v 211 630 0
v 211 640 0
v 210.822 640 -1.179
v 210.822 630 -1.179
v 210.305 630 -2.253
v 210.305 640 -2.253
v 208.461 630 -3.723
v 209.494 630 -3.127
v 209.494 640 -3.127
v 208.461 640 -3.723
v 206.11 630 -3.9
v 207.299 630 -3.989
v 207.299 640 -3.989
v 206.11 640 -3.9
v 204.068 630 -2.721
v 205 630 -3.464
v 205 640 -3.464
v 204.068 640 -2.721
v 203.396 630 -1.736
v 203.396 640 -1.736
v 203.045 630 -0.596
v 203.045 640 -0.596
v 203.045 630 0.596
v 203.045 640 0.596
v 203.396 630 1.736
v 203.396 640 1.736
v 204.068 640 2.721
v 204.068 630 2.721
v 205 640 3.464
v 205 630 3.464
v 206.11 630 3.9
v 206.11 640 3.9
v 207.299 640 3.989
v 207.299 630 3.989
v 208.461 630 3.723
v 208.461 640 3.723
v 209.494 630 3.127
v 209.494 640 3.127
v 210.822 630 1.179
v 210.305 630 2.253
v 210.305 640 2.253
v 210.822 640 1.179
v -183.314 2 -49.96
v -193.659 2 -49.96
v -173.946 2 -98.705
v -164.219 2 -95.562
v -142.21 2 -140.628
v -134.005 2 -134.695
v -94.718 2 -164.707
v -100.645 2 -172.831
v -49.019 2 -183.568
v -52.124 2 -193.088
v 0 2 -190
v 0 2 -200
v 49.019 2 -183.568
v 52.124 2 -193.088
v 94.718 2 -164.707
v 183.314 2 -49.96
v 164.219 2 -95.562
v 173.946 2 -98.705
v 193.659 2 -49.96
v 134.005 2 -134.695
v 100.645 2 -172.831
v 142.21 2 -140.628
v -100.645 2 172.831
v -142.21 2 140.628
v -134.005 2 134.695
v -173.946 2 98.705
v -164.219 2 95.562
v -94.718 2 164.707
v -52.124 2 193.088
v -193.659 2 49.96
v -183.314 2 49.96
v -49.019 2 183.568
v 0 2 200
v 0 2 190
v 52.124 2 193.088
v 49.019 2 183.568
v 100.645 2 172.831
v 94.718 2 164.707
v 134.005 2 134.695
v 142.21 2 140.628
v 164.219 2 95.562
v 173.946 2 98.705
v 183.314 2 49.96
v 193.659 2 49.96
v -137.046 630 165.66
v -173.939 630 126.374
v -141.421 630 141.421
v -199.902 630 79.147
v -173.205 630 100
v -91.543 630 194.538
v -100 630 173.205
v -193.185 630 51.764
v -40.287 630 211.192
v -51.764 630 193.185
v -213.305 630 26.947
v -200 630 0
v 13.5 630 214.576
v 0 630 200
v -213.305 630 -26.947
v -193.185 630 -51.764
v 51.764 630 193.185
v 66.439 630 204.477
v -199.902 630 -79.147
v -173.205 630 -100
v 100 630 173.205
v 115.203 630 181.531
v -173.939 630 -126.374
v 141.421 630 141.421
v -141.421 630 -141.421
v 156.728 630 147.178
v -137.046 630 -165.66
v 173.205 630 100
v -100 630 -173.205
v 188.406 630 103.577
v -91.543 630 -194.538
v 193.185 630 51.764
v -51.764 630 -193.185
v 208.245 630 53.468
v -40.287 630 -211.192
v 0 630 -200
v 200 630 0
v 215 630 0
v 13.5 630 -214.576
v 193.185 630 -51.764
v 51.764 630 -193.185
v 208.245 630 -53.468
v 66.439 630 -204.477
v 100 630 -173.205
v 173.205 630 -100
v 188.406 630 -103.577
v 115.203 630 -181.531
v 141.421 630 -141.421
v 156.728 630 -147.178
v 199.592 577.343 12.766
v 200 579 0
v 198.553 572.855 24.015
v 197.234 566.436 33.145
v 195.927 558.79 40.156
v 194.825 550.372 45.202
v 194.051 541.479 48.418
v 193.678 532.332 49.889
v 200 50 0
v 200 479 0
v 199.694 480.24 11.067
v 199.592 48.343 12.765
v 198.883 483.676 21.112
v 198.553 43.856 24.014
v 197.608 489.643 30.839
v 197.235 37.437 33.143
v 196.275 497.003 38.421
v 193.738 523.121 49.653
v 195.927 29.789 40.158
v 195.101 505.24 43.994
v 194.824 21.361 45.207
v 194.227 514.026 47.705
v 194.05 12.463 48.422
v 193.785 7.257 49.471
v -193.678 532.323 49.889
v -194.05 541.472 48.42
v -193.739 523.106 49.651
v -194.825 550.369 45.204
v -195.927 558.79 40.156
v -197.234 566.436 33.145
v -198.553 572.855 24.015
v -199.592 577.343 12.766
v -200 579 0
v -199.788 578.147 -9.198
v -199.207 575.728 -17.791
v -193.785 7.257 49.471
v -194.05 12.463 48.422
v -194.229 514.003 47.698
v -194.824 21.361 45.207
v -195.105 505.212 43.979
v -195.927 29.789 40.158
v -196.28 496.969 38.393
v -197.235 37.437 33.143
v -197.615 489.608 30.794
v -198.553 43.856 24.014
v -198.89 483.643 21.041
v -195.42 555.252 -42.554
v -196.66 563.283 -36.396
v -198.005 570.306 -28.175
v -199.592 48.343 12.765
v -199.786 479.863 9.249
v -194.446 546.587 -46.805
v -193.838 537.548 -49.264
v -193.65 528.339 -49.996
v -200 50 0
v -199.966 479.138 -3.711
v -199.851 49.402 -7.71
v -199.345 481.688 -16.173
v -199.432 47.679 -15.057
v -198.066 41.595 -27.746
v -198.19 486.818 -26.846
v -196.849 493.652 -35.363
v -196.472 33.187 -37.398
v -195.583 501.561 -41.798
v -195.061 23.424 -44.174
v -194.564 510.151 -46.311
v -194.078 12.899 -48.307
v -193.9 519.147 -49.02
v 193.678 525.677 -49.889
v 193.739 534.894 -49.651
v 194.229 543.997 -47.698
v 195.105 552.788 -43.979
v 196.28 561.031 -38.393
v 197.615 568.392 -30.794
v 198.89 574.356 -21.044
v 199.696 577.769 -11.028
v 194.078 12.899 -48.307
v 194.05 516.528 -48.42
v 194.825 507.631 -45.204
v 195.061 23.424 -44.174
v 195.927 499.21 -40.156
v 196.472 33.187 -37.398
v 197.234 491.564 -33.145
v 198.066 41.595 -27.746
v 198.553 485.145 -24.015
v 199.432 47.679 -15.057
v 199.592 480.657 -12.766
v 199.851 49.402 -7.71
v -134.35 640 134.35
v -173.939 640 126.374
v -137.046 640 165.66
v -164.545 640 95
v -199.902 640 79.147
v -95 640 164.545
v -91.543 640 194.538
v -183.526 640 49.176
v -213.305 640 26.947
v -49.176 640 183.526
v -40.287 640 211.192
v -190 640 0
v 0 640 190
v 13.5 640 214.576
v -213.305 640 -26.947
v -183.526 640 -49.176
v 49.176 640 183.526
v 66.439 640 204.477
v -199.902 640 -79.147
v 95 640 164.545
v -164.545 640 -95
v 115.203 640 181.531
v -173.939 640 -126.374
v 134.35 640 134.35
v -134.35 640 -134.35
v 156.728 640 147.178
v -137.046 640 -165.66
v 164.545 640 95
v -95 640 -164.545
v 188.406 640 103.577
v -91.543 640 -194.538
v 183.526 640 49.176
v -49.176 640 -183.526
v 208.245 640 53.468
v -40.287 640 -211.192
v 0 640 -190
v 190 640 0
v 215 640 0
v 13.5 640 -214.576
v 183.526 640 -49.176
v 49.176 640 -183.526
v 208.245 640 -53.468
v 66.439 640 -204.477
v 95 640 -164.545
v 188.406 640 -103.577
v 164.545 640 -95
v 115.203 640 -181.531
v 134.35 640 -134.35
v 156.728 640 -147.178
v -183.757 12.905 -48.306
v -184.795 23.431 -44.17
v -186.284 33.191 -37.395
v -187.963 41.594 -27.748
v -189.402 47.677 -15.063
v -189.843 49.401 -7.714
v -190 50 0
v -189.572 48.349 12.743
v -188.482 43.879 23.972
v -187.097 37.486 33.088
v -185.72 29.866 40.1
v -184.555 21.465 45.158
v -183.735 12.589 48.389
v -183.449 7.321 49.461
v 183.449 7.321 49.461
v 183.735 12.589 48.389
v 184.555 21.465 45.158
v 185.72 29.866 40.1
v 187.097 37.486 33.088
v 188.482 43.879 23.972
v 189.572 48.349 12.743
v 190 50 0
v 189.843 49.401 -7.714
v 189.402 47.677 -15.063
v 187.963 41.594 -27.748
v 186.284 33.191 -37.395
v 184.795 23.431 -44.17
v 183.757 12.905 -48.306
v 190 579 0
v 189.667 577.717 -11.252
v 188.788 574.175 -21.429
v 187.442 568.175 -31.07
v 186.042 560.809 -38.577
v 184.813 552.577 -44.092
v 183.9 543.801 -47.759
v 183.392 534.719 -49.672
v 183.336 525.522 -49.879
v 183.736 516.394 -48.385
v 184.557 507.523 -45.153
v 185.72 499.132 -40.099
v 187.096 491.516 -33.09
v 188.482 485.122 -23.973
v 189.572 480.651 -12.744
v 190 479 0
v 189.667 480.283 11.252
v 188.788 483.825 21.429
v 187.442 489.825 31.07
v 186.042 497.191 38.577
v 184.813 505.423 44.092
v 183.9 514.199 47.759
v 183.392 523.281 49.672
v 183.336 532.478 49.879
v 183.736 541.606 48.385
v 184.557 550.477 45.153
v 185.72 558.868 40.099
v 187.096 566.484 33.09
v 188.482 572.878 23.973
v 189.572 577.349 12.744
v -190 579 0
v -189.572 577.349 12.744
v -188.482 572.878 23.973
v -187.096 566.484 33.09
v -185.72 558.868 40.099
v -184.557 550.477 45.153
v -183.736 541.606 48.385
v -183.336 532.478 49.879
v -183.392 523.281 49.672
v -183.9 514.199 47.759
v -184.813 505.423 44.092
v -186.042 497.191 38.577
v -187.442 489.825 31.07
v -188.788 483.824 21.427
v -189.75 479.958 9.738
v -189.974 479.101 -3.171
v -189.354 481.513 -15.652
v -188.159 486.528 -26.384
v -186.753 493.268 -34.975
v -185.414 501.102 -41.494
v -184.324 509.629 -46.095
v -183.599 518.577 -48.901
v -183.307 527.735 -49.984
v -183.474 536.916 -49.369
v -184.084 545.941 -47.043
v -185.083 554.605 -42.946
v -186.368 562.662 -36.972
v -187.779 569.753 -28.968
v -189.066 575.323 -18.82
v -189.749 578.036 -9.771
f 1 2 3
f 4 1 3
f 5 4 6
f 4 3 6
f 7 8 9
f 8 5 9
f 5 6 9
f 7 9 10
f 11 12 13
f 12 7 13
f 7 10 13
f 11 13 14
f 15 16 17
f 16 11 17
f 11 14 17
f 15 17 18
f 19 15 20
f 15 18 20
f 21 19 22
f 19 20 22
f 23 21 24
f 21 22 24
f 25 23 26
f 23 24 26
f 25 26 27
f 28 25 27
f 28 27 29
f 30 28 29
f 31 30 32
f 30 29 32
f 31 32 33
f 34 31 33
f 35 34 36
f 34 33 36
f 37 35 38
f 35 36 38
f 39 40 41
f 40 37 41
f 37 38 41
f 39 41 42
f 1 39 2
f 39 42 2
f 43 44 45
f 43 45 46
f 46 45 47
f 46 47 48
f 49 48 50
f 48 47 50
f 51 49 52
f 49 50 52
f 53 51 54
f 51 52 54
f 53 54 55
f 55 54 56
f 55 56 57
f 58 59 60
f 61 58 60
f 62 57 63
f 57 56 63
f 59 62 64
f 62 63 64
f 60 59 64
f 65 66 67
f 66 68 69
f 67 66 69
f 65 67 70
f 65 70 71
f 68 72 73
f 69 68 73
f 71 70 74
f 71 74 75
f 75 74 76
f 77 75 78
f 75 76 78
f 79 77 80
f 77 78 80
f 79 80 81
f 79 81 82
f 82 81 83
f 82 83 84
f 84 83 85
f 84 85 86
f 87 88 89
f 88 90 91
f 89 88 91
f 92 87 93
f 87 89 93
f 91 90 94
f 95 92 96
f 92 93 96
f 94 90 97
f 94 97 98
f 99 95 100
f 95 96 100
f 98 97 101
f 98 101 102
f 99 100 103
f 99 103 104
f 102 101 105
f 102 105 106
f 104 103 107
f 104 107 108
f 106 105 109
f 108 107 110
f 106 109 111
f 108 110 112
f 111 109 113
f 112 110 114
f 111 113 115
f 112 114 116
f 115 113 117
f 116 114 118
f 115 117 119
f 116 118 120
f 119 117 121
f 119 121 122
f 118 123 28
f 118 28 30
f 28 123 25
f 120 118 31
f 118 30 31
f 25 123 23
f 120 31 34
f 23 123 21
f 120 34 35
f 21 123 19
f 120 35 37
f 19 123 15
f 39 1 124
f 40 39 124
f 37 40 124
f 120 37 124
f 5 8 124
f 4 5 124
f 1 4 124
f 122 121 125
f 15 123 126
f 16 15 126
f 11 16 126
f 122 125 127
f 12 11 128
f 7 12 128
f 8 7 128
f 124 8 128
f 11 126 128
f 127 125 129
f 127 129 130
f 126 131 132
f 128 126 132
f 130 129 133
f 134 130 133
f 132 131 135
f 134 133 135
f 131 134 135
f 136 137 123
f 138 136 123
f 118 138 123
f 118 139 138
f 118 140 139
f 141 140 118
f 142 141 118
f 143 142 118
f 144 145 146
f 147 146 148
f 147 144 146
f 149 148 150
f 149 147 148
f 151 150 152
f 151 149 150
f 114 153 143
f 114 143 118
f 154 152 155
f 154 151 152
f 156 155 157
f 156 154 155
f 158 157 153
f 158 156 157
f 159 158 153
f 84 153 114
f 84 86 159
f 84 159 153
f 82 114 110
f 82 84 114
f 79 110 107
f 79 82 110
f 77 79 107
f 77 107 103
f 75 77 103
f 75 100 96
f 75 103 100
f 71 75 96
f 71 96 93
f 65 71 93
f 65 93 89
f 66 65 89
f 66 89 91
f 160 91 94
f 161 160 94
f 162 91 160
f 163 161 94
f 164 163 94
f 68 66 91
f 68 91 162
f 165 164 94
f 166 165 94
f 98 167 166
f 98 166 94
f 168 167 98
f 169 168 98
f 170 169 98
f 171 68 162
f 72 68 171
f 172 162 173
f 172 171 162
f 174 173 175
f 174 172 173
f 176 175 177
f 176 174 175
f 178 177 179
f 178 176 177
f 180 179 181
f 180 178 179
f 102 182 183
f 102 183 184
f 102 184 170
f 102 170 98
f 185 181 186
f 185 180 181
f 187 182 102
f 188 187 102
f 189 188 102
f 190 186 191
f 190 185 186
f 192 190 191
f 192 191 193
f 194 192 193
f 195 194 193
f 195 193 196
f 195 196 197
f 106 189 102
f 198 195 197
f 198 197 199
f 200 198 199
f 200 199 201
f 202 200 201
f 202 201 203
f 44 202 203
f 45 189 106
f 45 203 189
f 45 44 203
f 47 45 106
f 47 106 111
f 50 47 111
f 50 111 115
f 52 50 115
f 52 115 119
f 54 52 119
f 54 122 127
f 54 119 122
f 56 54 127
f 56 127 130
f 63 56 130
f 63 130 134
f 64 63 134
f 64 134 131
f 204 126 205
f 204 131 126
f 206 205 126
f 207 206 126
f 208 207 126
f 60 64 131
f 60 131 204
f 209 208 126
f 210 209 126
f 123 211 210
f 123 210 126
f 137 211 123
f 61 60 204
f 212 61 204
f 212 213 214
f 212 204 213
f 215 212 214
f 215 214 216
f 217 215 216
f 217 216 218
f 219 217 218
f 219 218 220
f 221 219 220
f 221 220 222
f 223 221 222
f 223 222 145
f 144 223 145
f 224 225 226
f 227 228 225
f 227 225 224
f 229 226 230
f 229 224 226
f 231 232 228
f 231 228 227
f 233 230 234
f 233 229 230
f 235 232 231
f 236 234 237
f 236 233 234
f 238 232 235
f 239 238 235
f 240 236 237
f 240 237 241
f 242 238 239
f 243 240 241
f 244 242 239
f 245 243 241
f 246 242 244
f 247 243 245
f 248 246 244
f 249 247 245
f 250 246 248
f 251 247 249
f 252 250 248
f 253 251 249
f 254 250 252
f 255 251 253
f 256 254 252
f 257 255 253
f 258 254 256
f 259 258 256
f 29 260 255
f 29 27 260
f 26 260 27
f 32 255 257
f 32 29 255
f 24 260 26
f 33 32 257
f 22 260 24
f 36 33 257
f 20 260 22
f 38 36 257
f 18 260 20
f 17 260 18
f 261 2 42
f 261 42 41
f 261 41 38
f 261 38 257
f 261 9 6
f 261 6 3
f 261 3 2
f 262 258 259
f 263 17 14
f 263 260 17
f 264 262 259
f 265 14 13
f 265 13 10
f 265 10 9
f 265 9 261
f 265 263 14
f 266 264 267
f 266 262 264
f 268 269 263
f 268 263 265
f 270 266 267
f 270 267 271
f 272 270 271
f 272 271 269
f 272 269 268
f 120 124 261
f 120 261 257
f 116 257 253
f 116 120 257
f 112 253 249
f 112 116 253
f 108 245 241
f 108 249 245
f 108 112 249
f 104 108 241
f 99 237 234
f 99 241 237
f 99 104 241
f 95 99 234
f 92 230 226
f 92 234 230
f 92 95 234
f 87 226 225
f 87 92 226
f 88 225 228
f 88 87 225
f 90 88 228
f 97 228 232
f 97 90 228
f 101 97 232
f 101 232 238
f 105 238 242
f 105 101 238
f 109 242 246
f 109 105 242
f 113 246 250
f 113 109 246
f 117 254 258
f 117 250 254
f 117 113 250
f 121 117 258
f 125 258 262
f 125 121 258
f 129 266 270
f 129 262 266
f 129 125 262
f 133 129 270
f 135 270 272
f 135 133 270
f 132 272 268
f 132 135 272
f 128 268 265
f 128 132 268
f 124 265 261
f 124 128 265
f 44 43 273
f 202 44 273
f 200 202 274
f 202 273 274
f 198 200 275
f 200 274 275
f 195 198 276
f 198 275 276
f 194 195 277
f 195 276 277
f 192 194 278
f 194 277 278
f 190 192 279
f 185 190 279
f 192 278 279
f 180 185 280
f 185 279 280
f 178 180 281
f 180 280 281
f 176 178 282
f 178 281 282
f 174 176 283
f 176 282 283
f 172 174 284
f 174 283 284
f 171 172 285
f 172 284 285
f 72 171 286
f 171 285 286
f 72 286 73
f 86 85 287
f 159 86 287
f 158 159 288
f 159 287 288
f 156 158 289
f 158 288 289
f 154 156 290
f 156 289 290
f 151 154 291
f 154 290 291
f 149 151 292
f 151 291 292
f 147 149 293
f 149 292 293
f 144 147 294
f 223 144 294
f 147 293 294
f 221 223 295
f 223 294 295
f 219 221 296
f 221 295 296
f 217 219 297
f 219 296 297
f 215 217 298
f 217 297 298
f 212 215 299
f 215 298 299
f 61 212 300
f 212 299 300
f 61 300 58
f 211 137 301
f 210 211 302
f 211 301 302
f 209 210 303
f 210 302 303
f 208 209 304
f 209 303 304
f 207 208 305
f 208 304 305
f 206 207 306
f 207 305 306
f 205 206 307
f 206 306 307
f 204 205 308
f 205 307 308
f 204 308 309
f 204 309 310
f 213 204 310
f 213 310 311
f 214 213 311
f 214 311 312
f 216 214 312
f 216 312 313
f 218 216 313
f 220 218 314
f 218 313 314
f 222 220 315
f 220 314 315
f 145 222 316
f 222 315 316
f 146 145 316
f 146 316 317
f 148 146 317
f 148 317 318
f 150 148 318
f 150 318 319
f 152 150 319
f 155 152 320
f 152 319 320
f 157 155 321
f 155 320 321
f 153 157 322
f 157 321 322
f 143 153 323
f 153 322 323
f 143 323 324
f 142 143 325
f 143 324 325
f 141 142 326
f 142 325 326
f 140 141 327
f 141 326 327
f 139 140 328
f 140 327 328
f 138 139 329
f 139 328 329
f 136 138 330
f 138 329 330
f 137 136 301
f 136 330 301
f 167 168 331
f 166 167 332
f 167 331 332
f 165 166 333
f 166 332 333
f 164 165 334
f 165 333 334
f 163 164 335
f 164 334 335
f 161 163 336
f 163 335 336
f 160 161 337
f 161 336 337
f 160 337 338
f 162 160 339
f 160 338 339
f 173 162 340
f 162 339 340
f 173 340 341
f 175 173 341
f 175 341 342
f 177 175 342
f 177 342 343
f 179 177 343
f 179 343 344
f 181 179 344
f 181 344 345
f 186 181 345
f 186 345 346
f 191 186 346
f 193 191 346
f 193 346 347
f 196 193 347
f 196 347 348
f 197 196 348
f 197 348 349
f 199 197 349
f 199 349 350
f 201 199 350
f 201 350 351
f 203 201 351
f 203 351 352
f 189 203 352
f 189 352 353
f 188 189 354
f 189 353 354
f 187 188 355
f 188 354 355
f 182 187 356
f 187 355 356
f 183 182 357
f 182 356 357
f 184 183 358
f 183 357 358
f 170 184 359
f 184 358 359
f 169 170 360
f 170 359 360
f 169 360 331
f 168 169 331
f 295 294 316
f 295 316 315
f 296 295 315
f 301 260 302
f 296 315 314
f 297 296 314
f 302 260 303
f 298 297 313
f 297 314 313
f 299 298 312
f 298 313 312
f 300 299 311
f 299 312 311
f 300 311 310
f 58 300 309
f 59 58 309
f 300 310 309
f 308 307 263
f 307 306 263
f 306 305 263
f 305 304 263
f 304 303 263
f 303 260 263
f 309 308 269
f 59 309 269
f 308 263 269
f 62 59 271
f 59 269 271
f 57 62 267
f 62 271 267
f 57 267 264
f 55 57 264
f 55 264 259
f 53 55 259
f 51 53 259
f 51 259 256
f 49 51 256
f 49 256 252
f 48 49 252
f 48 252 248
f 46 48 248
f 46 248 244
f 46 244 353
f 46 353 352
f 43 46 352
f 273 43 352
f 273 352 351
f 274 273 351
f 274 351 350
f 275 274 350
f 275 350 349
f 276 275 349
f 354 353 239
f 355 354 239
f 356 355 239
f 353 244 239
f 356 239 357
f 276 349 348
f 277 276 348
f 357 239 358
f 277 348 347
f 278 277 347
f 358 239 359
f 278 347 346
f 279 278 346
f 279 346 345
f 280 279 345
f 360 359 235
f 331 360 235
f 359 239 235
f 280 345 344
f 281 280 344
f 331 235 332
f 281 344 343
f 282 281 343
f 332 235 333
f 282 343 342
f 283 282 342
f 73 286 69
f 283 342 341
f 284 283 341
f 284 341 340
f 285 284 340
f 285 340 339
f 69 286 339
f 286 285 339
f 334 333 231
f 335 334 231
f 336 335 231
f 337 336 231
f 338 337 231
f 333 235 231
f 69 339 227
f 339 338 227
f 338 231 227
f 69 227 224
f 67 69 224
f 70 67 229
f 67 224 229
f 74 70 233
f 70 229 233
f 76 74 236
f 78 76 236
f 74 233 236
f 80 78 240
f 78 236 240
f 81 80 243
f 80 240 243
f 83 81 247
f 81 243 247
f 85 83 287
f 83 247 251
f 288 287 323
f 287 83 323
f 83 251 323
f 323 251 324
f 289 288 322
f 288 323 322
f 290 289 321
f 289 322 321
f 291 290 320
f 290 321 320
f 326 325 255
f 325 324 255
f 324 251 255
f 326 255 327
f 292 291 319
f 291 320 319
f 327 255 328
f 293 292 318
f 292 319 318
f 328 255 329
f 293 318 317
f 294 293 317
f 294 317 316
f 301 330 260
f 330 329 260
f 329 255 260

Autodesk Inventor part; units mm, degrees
ref_plane "YZ Plane" through (0, 0, 0) normal (1, 0, 0) x (0, 1, 0)
ref_plane "XZ Plane" through (0, 0, 0) normal (0, 1, 0) x (-1, 0, 0)
ref_plane "XY Plane" through (0, 0, 0) normal (0, 0, 1) x (1, 0, 0)
sketch "Эскиз1" plane through (0, 0, 0) normal (0, 0, 1) x (1, 0, 0)
  line L0 (0, 0) -> (190, 0)
  line L1 (190, 0) -> (190, 640)
  line L2 (190, 640) -> (215, 640)
  line L3 (215, 640) -> (215, 630)
  line L4 (215, 630) -> (200, 630)
  line L5 (200, 630) -> (200, 0)
  line L6 (200, 0) -> (190, 0)
  line L7 (0, -128) -> (0, 768) projected
  line L8 (200, 0) -> (200, 2)
  line L9 (200, 2) -> (190, 2)
  dimension "d0" = 190
  dimension "d1" = 640
  dimension "d2" = 25
  dimension "d3" = 10
  dimension "d20" = 2
revolve "Вращение1" add sketch "Эскиз1" angle 360 about axis through (0, -10, 0) along (0, 1, 0) contours L1 L2 L3 L4 L5 L9
sketch "Эскиз2" plane through (0, 640, 0) normal (0, 1, 0) x (1, 0, 0)
  circle A0 centre (207, 0) radius 4
  circle A1 centre (0, 0) radius 190 projected
  line L0 (190, 0) -> (207, 0)
  dimension "d6" = 8
  dimension "d19" = 17
extrude "Выдавливание1" cut sketch "Эскиз2" against normal through all contours A0
sketch "Эскиз3" plane through (0, 0, 0) normal (1, 0, 0) x (0, 1, 0)
  line L0 (630, 215) -> (630, -215) projected
  line L1 (630, 200) -> (630, -200) projected
  line L2 (630, 0) -> (529, 0)
  circle A0 centre (529, 0) radius 50
  line L3 (0, 0) -> (0, 0)
  circle A1 centre (0, 0) radius 50
  dimension "d11" = 101
  dimension "d12" = 100
  dimension "d17" = 0
  dimension "d18" = 100
extrude "Выдавливание2" cut sketch "Эскиз3" along normal through all both and the other way through all
properties part number "Втулка_CPY" material "Сталь, легированная"
